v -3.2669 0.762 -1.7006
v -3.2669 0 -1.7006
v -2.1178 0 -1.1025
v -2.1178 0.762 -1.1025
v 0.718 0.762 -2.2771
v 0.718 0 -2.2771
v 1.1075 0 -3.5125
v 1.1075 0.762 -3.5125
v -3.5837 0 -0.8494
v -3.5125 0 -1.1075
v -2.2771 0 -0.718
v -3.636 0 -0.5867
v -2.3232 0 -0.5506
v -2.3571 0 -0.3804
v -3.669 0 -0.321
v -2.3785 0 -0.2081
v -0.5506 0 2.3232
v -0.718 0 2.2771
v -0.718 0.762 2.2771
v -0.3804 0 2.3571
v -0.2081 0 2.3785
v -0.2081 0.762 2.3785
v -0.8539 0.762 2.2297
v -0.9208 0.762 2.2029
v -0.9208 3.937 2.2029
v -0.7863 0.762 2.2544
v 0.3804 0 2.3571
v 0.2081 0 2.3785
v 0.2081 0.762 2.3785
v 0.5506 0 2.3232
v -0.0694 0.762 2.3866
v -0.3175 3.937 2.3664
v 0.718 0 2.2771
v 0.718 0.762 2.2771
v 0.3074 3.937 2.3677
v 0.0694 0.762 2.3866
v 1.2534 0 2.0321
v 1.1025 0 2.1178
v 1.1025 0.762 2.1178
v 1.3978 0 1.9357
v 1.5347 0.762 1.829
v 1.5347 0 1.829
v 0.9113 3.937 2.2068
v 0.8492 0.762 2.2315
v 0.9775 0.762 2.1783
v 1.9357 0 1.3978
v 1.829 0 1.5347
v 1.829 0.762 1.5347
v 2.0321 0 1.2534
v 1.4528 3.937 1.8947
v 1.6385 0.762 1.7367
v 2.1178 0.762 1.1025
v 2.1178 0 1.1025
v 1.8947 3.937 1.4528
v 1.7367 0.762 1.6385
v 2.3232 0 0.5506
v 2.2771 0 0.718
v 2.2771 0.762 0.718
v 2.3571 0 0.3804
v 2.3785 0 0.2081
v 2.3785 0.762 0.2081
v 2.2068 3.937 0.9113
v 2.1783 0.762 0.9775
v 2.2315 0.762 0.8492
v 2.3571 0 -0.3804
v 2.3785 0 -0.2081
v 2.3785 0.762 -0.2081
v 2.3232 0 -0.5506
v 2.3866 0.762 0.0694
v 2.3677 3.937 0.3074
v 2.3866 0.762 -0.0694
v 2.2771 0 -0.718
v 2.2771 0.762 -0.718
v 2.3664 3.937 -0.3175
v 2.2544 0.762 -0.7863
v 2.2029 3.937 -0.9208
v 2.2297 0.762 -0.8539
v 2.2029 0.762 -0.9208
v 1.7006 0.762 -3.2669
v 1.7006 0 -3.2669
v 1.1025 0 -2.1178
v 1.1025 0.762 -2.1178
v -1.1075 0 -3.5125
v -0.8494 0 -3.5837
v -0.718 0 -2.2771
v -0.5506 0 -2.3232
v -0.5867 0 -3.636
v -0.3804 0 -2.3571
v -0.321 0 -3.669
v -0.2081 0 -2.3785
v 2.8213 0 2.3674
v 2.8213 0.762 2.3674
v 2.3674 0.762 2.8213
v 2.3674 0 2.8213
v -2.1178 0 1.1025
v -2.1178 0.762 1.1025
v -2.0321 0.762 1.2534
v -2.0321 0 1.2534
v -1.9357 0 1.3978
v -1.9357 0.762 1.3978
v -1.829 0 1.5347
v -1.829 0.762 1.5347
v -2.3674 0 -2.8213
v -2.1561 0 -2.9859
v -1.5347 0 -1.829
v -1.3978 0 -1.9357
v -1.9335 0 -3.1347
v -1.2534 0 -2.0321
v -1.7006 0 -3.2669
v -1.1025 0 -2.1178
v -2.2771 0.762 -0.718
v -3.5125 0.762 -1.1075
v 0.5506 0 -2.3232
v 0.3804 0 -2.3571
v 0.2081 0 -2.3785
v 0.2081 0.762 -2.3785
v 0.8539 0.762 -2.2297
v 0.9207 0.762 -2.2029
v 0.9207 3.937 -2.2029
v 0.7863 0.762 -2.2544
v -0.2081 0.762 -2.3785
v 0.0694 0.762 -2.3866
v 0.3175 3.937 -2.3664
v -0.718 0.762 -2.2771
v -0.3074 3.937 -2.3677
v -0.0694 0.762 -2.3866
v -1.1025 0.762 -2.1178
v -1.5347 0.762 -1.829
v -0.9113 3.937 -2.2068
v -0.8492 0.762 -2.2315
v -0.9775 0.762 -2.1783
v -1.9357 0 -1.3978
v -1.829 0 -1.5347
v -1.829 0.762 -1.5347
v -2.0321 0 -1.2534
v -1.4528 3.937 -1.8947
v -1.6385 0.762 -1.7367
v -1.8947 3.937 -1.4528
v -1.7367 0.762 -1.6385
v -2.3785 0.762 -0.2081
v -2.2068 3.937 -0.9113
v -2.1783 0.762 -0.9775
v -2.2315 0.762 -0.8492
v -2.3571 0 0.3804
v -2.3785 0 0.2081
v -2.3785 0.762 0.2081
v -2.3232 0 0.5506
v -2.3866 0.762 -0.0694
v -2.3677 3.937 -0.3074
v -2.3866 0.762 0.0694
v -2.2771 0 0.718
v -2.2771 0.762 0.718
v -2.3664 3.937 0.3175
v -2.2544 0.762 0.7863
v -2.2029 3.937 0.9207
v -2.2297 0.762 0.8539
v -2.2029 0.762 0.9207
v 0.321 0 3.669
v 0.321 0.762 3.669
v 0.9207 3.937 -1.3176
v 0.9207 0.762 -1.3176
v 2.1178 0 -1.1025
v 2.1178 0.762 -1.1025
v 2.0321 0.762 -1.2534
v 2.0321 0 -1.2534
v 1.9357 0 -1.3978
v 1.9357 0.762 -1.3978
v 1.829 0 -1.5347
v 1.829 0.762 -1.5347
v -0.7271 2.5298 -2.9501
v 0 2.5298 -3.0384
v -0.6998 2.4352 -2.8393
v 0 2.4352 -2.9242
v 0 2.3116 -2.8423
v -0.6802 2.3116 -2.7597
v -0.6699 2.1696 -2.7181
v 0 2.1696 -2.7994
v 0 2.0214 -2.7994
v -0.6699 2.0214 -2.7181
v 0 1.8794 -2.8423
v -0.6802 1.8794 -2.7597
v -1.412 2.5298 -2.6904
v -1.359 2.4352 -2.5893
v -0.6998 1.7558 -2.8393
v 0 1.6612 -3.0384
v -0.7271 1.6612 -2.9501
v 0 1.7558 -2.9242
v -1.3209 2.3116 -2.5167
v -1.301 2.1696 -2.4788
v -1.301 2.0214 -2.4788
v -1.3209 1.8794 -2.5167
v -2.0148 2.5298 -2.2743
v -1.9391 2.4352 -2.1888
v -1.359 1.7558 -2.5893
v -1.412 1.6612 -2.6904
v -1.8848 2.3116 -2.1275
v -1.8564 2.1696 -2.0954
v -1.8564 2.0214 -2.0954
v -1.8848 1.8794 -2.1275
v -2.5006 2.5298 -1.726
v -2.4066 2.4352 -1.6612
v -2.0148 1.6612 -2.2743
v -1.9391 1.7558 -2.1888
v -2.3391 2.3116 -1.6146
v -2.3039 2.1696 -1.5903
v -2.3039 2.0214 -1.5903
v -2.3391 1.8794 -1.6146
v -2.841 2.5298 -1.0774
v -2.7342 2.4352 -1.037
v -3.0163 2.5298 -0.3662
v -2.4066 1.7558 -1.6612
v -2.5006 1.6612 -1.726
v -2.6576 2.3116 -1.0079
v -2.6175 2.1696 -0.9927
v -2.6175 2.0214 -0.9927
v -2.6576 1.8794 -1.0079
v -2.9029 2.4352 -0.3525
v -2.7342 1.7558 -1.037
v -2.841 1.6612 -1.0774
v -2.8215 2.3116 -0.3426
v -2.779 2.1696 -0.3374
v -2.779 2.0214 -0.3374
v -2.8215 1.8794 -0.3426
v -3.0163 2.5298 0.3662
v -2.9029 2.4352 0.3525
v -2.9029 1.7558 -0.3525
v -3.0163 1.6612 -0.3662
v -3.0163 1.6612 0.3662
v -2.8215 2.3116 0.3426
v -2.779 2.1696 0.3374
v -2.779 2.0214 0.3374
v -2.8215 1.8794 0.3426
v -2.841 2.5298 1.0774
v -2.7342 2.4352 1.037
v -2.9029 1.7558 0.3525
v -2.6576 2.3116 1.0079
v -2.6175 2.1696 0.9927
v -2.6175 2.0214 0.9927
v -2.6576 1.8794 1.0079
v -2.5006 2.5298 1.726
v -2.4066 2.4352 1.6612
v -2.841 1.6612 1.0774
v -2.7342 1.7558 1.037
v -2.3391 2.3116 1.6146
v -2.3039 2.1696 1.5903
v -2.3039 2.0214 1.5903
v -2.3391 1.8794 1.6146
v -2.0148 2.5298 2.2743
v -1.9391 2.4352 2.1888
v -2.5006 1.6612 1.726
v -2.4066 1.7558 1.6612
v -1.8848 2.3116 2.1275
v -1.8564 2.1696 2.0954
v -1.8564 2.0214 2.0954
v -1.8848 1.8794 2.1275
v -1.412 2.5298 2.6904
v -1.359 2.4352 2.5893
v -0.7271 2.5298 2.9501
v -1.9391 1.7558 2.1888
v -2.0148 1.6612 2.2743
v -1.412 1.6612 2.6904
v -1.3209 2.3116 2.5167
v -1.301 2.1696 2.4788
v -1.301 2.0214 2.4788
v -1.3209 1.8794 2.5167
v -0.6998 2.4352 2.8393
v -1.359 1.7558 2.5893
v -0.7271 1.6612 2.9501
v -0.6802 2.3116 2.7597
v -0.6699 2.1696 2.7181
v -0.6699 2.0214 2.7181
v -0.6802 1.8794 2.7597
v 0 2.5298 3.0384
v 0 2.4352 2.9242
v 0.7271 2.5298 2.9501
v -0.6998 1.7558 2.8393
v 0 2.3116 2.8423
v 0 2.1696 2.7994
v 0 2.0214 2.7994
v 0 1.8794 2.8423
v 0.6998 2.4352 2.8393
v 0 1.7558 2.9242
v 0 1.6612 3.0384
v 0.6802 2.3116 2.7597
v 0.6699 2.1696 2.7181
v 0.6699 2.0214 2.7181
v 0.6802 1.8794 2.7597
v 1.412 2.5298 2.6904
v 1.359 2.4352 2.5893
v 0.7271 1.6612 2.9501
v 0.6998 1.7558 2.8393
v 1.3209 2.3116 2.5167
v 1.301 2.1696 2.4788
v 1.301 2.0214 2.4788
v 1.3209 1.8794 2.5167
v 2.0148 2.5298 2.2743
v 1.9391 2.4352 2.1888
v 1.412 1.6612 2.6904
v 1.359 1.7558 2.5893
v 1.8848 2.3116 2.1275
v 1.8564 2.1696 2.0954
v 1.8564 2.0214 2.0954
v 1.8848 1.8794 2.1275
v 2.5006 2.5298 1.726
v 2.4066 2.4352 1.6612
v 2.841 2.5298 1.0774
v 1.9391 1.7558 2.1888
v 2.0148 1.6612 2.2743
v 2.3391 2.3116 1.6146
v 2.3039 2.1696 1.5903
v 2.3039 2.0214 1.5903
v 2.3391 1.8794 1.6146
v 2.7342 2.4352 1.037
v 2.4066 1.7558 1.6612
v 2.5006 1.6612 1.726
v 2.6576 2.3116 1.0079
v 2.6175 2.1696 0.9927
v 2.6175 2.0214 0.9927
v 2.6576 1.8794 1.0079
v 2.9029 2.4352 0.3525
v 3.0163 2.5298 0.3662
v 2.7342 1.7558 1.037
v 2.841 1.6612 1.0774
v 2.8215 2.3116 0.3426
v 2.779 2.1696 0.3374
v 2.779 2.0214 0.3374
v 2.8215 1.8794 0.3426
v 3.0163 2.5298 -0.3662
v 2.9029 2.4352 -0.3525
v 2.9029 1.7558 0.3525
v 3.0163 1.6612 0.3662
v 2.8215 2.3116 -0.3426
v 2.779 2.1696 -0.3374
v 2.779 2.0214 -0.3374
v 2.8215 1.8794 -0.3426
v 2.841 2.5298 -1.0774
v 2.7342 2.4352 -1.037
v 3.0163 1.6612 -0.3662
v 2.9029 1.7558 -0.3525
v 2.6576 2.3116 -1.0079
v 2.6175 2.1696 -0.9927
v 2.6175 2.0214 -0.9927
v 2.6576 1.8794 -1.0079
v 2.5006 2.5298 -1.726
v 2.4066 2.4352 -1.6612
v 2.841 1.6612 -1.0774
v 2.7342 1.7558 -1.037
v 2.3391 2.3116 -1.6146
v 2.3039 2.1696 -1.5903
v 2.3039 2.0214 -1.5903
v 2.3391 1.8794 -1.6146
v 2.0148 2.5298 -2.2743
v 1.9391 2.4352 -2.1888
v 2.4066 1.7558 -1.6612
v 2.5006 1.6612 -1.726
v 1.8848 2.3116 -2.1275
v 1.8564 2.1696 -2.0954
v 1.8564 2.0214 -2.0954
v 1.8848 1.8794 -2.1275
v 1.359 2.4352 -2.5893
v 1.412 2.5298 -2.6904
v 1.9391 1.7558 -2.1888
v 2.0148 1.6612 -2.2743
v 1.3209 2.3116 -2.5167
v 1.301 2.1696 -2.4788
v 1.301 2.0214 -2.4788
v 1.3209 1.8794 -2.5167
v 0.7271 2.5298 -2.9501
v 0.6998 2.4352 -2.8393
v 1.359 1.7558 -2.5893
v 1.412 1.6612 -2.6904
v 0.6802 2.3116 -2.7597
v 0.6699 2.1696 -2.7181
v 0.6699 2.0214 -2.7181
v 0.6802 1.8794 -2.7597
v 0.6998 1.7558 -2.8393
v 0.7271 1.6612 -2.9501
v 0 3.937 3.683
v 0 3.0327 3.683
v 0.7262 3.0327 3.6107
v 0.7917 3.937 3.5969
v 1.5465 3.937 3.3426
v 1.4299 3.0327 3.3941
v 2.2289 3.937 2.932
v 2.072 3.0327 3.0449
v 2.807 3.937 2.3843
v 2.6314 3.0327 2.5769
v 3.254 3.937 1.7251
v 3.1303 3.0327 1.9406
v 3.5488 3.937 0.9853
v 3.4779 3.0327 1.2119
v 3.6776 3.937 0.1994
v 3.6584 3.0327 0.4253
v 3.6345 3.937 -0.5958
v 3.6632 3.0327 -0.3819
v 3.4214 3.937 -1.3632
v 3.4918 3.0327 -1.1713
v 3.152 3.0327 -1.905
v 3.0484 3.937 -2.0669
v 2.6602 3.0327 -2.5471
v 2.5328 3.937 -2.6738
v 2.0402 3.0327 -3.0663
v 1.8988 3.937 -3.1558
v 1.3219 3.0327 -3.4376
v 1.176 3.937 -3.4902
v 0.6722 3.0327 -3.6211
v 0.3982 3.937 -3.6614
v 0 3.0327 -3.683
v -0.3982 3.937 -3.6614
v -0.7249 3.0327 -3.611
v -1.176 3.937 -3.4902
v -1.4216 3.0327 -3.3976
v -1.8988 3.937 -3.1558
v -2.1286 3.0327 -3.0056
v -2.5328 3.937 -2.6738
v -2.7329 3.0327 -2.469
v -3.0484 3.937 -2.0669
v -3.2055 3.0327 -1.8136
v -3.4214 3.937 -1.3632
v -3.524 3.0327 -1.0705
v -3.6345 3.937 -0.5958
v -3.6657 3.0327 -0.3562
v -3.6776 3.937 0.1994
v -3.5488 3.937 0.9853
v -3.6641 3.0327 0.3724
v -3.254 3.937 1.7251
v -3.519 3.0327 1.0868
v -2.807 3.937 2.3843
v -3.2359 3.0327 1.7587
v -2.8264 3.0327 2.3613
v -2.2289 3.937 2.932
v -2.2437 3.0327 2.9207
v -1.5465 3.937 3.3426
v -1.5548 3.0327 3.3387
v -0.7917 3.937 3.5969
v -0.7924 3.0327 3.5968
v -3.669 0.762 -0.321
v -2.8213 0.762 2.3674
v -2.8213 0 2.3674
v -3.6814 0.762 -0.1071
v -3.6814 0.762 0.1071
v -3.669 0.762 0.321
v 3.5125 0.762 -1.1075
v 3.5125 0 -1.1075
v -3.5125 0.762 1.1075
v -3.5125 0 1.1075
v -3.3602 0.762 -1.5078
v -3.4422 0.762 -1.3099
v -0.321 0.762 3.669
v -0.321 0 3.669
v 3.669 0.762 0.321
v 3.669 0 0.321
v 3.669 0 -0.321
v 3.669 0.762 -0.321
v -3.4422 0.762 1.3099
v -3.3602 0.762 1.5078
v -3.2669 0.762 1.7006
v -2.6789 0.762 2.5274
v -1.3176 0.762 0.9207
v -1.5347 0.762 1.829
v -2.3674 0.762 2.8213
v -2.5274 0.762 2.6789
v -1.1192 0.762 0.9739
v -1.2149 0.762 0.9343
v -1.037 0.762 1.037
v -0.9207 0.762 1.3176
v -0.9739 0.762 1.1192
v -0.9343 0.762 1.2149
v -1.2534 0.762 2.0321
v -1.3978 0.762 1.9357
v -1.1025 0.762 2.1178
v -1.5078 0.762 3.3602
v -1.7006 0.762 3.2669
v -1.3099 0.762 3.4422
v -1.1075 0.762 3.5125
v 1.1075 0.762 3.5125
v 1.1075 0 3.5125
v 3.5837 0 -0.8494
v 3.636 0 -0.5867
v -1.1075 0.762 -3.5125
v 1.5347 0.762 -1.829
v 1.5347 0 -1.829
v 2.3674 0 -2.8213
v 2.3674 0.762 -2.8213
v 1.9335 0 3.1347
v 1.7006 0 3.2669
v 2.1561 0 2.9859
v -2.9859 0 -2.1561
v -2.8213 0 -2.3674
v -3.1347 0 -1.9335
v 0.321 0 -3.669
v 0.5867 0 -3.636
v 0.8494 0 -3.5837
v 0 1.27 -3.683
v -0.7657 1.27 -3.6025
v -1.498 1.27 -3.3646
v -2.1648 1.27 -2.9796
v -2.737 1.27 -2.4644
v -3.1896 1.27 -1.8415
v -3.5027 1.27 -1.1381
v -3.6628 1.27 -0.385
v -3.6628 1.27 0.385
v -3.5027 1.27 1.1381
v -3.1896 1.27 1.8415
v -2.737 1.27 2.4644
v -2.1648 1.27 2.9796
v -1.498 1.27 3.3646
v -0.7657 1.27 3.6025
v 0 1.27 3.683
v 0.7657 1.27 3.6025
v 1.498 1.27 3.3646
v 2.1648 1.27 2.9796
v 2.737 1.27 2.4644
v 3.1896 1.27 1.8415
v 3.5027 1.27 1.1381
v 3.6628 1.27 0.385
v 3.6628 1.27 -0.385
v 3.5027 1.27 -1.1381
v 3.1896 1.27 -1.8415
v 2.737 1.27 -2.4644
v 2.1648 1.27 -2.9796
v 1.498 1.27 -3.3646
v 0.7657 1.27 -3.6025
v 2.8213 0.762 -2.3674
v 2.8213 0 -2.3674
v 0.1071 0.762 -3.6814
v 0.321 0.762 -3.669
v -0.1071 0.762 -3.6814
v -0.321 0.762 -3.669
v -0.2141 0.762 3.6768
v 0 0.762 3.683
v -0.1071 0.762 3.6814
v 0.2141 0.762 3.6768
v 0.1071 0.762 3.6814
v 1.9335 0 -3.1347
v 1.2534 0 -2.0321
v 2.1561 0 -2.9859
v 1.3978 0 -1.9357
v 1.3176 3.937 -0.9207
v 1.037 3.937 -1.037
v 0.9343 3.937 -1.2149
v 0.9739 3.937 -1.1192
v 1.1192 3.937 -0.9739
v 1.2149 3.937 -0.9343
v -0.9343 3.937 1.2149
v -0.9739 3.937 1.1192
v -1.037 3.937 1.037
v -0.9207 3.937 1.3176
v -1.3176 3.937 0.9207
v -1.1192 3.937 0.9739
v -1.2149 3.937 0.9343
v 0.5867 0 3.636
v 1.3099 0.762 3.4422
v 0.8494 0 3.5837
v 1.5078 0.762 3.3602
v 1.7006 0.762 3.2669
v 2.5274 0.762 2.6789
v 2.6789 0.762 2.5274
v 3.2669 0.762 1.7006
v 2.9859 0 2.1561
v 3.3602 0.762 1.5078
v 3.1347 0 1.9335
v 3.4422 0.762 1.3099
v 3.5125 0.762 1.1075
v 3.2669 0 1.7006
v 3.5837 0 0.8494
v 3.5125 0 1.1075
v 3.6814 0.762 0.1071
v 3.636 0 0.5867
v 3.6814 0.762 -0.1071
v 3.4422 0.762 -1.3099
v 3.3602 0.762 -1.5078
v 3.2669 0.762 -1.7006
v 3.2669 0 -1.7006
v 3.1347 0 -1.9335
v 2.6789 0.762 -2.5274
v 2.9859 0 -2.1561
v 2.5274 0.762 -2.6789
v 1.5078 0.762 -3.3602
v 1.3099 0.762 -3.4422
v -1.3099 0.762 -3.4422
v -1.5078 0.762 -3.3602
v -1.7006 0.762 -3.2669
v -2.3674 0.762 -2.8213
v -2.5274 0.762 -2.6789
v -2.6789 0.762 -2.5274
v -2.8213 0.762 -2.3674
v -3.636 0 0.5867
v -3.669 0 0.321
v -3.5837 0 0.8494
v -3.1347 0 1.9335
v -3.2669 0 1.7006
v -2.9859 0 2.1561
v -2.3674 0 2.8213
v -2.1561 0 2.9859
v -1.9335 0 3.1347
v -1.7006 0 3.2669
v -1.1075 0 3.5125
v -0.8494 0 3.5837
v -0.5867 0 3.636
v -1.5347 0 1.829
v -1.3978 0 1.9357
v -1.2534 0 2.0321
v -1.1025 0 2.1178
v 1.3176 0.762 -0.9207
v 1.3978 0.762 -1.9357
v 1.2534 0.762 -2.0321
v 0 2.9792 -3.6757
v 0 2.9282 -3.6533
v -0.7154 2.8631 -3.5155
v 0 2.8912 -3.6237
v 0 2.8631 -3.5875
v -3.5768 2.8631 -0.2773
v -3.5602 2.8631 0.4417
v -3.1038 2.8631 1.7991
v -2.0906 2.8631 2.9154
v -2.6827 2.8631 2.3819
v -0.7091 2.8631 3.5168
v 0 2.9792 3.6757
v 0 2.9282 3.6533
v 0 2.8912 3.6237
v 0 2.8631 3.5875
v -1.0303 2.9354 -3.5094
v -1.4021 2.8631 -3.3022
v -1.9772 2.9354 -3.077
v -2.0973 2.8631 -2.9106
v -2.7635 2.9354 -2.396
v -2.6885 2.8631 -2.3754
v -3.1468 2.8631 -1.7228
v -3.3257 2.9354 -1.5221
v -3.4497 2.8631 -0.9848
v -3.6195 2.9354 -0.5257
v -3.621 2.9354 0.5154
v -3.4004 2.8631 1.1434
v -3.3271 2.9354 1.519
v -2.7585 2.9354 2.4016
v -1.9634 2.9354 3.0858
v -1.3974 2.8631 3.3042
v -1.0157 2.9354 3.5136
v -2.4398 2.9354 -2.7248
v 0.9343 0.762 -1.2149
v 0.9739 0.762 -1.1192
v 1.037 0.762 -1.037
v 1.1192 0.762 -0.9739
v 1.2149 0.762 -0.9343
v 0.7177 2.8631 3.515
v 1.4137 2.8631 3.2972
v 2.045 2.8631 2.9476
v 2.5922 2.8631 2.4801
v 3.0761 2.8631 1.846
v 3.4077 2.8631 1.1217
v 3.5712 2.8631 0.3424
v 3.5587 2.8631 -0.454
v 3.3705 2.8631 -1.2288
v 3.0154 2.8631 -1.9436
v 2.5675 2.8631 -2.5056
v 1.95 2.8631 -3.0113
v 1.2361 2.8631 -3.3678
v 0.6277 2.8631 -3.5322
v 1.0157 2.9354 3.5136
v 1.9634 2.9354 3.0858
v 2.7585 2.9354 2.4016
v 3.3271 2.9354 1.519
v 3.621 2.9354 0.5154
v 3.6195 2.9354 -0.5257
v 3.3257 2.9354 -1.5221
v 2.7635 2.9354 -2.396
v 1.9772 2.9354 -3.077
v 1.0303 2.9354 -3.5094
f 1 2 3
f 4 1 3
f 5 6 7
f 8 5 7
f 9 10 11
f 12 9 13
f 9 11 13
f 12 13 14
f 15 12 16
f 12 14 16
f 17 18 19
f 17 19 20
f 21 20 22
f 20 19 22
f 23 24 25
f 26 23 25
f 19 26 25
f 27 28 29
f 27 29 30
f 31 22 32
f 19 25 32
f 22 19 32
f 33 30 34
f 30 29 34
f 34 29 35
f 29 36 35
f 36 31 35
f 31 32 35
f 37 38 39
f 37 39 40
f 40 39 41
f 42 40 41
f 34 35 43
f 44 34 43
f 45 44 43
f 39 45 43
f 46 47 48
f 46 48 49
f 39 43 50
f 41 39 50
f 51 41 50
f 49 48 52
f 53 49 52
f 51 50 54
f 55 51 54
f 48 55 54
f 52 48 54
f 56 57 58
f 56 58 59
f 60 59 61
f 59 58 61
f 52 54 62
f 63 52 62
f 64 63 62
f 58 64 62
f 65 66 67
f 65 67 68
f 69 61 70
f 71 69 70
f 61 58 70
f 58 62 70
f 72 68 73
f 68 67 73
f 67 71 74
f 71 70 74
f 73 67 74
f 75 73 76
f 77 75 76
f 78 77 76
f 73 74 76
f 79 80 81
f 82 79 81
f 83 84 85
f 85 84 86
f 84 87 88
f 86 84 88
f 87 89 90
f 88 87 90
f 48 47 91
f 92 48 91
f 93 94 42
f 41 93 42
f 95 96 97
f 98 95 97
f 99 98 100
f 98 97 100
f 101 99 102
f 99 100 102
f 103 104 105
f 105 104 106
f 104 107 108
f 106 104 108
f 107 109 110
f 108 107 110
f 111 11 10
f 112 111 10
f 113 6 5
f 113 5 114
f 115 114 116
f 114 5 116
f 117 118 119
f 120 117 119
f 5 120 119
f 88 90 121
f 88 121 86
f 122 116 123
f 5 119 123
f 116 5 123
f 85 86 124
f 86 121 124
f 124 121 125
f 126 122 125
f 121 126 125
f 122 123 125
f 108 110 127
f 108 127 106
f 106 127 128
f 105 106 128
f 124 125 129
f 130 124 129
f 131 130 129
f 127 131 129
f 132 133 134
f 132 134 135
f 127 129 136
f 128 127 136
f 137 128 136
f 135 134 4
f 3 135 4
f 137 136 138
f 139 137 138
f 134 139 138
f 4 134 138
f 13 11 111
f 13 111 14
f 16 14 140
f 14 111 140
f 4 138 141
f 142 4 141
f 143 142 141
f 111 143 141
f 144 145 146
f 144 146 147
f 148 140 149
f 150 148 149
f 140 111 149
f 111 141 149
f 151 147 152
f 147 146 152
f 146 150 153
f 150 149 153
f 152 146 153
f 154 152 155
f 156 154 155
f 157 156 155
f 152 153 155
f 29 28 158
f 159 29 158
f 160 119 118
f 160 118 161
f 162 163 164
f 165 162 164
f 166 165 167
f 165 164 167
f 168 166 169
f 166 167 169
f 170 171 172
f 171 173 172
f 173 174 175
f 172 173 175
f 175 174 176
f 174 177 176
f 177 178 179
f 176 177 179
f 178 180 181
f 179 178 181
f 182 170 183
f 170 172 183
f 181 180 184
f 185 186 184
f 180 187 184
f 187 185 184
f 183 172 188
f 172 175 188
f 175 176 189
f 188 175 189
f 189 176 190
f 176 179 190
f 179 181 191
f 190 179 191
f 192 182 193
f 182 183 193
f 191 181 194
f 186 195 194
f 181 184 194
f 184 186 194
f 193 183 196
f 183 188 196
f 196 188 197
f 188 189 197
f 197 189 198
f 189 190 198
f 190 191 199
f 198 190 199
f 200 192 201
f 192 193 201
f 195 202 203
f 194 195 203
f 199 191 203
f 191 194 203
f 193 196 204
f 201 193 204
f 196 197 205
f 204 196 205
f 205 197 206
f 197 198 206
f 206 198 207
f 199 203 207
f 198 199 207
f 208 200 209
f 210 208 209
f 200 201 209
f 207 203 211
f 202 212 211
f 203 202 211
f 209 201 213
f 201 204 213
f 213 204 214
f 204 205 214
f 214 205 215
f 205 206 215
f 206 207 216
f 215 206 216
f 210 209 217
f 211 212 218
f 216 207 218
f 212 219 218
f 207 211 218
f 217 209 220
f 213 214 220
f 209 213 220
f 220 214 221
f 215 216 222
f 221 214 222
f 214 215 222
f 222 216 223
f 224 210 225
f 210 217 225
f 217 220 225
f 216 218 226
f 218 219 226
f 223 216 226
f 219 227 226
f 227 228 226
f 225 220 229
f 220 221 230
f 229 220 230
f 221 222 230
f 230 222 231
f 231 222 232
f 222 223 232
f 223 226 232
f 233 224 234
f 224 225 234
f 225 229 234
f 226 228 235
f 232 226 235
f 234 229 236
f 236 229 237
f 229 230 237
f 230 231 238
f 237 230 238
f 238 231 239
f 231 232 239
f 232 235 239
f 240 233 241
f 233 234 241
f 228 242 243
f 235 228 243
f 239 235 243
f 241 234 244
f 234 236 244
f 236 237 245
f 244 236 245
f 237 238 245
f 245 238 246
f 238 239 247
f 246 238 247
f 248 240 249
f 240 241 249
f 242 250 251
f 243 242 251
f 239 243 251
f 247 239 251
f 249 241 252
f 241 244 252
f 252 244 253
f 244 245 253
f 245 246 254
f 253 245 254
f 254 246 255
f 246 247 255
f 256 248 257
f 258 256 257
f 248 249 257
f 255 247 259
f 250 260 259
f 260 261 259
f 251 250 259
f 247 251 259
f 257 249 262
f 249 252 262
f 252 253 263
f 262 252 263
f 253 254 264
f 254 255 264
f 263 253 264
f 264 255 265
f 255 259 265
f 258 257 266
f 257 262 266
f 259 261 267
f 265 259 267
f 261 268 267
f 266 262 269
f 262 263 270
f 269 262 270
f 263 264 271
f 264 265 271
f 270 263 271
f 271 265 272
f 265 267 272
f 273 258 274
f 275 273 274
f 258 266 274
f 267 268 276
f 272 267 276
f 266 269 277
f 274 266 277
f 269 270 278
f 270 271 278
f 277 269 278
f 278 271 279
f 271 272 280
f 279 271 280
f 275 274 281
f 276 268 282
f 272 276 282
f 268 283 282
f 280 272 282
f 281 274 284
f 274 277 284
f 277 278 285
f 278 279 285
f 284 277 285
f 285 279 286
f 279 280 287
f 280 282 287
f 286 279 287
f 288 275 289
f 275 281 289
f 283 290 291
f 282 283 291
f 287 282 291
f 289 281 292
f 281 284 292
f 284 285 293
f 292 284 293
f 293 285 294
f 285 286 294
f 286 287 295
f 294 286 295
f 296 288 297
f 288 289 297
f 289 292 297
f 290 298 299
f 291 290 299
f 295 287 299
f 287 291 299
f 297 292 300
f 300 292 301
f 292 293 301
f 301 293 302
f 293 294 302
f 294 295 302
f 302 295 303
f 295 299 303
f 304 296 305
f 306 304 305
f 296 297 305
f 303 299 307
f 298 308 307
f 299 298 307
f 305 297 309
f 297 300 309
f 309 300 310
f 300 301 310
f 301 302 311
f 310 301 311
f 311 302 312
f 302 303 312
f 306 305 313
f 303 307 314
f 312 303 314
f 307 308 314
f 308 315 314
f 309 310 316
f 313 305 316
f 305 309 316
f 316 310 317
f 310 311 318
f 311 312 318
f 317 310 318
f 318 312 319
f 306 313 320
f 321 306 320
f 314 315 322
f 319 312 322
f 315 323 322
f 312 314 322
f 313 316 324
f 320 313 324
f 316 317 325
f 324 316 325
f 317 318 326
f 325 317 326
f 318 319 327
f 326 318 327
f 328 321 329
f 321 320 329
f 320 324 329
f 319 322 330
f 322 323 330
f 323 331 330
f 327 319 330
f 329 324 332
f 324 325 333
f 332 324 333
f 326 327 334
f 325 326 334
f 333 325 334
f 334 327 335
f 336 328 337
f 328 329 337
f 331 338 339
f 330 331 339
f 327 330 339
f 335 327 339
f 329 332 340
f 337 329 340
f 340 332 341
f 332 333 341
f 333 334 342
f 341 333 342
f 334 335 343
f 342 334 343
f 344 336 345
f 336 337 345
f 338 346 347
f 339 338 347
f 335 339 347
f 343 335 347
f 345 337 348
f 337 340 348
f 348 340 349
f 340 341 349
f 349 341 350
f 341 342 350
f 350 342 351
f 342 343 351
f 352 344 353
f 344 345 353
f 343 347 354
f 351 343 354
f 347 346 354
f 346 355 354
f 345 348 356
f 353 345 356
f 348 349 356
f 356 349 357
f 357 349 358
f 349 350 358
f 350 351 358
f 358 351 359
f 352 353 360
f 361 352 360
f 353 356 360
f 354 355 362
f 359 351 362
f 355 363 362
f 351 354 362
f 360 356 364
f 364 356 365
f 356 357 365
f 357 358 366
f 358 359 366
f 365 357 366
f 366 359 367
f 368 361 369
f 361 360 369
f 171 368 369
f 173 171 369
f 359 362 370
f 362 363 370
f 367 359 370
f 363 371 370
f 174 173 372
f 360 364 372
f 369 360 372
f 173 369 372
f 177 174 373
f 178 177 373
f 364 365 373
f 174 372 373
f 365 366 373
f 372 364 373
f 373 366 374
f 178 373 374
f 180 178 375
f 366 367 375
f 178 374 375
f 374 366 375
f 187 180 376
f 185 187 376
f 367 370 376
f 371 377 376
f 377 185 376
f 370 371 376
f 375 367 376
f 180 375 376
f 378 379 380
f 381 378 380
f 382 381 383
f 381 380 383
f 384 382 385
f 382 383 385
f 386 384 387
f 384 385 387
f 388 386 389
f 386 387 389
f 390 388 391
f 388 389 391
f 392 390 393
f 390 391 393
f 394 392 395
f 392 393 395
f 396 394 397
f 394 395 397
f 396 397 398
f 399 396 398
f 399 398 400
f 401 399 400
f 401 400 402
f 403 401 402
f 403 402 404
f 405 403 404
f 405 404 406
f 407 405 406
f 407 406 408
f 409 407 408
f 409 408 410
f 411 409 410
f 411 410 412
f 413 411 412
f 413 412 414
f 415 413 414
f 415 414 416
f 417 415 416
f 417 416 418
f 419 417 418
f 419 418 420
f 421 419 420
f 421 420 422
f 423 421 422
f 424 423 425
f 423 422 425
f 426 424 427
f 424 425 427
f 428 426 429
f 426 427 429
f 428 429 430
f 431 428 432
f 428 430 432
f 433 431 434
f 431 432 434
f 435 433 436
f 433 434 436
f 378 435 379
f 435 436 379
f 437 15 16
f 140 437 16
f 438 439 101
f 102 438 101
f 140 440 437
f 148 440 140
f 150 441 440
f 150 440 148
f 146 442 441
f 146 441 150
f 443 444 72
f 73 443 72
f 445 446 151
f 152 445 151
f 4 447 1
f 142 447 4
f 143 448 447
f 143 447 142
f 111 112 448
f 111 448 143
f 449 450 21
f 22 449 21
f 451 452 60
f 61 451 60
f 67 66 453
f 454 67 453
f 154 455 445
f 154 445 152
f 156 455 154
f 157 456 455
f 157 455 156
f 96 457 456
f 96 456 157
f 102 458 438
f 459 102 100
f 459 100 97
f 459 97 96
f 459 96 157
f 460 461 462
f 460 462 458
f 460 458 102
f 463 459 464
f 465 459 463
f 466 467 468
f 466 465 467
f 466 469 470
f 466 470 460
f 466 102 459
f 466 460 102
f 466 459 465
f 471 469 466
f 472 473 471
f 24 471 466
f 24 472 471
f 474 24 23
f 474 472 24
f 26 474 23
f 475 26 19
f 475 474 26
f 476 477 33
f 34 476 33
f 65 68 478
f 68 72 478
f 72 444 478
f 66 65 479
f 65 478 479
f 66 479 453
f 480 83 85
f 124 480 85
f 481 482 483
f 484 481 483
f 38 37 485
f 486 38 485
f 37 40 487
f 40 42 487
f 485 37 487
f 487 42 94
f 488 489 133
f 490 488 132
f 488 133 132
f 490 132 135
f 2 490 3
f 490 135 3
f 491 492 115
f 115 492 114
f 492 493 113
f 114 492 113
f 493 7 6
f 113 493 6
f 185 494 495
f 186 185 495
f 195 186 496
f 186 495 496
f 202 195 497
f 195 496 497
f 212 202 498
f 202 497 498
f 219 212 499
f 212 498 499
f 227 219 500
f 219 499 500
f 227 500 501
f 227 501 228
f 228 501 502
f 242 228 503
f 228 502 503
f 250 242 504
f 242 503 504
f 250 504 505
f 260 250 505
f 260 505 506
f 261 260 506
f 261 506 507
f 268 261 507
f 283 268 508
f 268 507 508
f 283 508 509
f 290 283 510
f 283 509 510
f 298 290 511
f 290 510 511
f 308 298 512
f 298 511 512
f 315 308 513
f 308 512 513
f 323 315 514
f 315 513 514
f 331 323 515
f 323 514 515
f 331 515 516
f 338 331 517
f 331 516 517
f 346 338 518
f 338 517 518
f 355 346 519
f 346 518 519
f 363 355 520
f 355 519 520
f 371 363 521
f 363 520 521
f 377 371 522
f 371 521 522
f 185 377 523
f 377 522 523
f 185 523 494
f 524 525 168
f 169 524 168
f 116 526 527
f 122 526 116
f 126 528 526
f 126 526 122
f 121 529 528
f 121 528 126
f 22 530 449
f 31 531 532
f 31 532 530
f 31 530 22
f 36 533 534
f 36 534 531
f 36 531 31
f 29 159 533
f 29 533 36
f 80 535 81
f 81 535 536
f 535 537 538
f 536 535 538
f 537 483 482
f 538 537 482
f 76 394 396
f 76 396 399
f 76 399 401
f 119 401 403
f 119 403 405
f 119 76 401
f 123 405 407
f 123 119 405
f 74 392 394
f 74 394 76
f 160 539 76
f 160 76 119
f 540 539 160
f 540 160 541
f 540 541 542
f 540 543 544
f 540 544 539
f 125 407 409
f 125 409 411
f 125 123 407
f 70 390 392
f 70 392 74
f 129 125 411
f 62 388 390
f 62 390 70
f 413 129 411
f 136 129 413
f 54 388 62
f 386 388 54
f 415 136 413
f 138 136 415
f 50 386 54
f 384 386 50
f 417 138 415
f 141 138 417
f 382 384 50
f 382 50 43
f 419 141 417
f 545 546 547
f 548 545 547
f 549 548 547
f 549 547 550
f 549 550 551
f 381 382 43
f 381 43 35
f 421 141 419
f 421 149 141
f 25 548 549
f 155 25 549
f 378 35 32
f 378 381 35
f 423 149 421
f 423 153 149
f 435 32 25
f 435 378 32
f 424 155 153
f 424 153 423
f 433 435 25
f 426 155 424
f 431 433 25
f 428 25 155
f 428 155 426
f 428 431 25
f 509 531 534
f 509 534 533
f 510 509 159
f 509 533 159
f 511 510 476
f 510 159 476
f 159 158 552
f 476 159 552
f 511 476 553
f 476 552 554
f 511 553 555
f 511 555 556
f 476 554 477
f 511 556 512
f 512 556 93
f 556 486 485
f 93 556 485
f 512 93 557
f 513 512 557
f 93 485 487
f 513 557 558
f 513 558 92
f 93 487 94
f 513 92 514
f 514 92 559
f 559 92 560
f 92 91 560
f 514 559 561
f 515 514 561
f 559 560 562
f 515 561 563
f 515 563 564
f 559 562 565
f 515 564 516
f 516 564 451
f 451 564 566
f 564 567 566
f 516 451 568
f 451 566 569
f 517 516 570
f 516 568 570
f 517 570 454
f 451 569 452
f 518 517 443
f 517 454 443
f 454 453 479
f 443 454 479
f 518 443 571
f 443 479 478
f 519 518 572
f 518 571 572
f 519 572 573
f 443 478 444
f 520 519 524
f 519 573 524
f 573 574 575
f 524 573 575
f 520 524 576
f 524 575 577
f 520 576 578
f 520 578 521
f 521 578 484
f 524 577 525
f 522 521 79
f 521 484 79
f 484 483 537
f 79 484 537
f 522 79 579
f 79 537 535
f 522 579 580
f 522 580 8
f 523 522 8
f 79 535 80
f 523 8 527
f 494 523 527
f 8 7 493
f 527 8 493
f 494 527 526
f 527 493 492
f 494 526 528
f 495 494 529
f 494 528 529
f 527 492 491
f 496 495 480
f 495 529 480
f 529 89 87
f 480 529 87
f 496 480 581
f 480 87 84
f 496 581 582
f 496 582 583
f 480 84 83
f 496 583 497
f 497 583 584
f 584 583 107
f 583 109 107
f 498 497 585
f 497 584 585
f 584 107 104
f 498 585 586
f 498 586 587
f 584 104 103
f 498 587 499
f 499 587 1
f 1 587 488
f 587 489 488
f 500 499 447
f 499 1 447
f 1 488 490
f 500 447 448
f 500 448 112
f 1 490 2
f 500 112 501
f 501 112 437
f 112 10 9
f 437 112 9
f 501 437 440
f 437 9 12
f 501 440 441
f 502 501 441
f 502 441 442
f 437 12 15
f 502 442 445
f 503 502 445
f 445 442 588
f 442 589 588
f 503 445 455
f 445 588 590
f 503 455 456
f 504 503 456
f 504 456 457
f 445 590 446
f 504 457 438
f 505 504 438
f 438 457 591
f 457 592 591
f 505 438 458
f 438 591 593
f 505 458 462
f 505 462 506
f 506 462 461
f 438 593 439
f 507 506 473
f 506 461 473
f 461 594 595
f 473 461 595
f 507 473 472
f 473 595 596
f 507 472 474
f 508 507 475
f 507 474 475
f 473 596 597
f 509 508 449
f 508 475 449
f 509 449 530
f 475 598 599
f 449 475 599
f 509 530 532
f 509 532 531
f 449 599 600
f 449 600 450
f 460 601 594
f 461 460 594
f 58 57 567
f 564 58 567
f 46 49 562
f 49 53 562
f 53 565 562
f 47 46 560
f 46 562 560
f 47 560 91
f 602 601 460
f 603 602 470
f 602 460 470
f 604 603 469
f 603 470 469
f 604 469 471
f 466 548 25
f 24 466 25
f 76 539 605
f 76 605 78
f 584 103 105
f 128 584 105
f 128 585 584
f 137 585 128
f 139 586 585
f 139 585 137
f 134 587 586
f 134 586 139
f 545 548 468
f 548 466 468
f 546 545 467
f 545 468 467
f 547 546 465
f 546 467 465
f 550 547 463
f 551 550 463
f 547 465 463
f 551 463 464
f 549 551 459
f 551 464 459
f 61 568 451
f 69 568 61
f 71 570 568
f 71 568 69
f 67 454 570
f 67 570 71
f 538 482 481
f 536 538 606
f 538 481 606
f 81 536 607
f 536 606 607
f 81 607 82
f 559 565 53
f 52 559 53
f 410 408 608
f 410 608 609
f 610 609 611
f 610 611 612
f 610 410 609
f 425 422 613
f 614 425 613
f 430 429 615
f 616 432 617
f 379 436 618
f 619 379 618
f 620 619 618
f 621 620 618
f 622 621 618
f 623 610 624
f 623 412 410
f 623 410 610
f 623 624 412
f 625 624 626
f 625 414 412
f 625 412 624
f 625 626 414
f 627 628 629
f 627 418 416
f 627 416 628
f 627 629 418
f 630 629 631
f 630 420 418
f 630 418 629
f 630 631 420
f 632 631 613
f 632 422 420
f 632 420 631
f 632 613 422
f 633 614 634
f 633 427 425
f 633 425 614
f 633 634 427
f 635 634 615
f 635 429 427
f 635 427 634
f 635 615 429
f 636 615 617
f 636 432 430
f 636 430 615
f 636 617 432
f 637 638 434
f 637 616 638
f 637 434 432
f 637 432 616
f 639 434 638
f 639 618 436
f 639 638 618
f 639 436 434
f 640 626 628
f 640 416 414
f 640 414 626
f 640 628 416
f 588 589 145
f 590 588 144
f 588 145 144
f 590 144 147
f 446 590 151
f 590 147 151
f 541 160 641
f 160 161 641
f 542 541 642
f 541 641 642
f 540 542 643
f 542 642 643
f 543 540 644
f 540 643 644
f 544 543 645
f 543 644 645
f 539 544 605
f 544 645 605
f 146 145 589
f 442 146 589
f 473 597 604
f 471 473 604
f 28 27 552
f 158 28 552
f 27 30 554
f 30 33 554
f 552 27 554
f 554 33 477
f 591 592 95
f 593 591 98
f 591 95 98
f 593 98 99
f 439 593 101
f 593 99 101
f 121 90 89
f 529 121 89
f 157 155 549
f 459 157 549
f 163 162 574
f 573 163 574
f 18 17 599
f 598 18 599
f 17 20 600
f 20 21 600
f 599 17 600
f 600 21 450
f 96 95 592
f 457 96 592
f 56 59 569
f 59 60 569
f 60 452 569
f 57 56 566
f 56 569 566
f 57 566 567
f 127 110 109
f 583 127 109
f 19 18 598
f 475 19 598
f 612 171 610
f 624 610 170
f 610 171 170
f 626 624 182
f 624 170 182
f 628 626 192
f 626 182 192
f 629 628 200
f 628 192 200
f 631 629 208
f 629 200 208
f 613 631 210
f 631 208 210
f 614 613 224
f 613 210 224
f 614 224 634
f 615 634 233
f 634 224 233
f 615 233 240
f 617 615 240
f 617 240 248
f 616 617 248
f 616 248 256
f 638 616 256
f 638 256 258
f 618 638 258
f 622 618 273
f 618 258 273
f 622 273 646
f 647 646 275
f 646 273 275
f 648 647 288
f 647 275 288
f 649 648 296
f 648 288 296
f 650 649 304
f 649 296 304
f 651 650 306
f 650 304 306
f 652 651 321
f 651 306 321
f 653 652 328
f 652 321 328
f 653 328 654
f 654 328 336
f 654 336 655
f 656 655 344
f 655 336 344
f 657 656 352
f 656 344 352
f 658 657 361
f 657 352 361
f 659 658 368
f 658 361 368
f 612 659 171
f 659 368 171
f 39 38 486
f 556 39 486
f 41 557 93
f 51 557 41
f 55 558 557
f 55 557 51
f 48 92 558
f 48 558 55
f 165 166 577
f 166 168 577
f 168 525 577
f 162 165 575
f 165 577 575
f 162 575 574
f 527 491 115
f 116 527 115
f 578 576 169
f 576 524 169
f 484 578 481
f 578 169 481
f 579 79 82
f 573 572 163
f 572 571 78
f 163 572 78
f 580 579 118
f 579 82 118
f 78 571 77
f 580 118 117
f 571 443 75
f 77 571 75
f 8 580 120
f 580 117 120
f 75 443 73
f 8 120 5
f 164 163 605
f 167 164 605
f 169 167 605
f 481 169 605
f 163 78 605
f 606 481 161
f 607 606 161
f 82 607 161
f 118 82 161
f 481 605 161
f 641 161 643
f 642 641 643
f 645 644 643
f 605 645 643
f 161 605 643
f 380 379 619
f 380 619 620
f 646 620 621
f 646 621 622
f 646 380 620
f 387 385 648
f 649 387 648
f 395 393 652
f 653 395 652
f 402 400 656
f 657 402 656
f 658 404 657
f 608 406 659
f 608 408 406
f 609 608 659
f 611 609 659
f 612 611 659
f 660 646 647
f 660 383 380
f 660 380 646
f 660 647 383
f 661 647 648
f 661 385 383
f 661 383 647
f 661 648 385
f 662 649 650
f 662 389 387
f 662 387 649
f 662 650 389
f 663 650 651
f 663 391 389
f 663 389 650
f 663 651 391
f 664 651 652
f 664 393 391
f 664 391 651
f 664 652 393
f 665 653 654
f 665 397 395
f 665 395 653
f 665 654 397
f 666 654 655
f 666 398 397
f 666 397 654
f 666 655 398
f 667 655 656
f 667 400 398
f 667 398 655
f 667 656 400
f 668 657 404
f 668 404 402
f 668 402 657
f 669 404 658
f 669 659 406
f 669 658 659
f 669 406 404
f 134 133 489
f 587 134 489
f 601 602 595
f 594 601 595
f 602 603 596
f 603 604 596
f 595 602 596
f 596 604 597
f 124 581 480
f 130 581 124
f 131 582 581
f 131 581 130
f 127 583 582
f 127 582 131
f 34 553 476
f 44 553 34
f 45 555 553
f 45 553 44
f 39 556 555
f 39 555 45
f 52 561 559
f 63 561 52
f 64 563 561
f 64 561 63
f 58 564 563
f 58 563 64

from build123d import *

# Parameters (mm, degrees)
SKETCH1_R           = 3.683
BASE_EXTRUDE_DEPTH  = 3.937
SKETCH2_R           = 2.3876
CUT_EXTRUDE1_DEPTH  = 7.529084698
CUT_EXTRUDE2_DEPTH  = 0.762
CIRPATTERN1_COUNT   = 16
BOSS_EXTRUDE1_DEPTH = 3.175
FILLET1_R           = 0.396875
FILLET2_R           = 0.1984375


with BuildPart() as part:
    # Sketch1 → Base-Extrude (new body)
    with BuildSketch(Plane(origin=(0, 0, 0), x_dir=(1, 0, 0), z_dir=(0, 1, 0))):
        with Locations(Location((0, 0, 0), (0, 0, 270))):
            Circle(SKETCH1_R)
    extrude(amount=BASE_EXTRUDE_DEPTH)

    # Sketch2 → Cut-Extrude1 (cut, through all)
    with BuildSketch(Plane(origin=(0, 3.937, 0), x_dir=(-1, 0, 0), z_dir=(0, 1, 0))):
        with Locations(Location((0, 0, 0), (0, 0, 90))):
            Circle(SKETCH2_R)
    extrude(amount=-CUT_EXTRUDE1_DEPTH, mode=Mode.SUBTRACT)

    # Sketch4 → Cut-Revolve1 (revolve, cut)
    with BuildSketch(Plane.XY, mode=Mode.PRIVATE) as cut_revolve1_sk:
        with BuildLine():
            Line((3.683, 2.921), (3.038418755, 2.529768267))
            ThreePointArc((3.038418755, 2.529768267), (2.794, 2.0955), (3.038418755, 1.661231733))
            Line((3.038418755, 1.661231733), (3.683, 1.27))
            Line((3.683, 1.27), (3.683, 2.921))
        make_face()
    revolve(cut_revolve1_sk.sketch.rotate(Axis((0, 0, 0), (0, 1, 0)), 90), axis=Axis((0, 0, 0), (0, 1, 0)), mode=Mode.SUBTRACT)

    # Sketch5 → Cut-Extrude2 (cut)
    with BuildSketch(Plane(origin=(16.494267977, 0, 2.582932293), x_dir=(1, 0, 0), z_dir=(0, -1, 0))):
        with BuildLine():
            Line((-18.872782439, -2.374839241), (-20.163253051, -2.261937692))
            ThreePointArc((-20.163253051, -2.261937692), (-20.177267977, -2.582932293), (-20.163253051, -2.903926893))
            Line((-20.163253051, -2.903926893), (-18.872782439, -2.791025344))
            ThreePointArc((-18.872782439, -2.791025344), (-18.881867977, -2.582932293), (-18.872782439, -2.374839241))
        make_face()
    cut_extrude2 = extrude(amount=-CUT_EXTRUDE2_DEPTH, mode=Mode.SUBTRACT)

    # CirPattern1: Cut-Extrude2 ×16 about axis
    cirpattern1_axis = Axis((0, 0, 0), (0, 1, 0))
    for i in range(1, CIRPATTERN1_COUNT):
        add(cut_extrude2.rotate(cirpattern1_axis, i * 360 / CIRPATTERN1_COUNT), mode=Mode.SUBTRACT)

    # Sketch6 → Boss-Extrude1 (add)
    with BuildSketch(Plane(origin=(0, 3.937, 0), x_dir=(-1, 0, 0), z_dir=(0, 1, 0))):
        with BuildLine():
            Line((-0.92075, -2.202919244), (-0.92075, -0.92075))
            Line((-0.92075, -0.92075), (-2.202919244, -0.92075))
            ThreePointArc((-2.202919244, -0.92075), (-1.688288151, -1.688288151), (-0.92075, -2.202919244))
        make_face()
        with BuildLine():
            Line((2.202919244, 0.92075), (0.92075, 0.92075))
            Line((0.92075, 0.92075), (0.92075, 2.202919244))
            ThreePointArc((0.92075, 2.202919244), (1.688288151, 1.688288151), (2.202919244, 0.92075))
        make_face()
    extrude(amount=-BOSS_EXTRUDE1_DEPTH)

    # Fillet1
    fillet1_edges = [part.edges().sort_by_distance(p)[0] for p in [
        (0.92075, 2.3495, -0.92075),
        (-0.92075, 2.3495, 0.92075),
    ]]
    fillet(fillet1_edges, radius=FILLET1_R)

    # Fillet2
    fillet2_edges = [part.edges().sort_by_distance(p)[0] for p in [
        (-3.683, 2.921, 0),
        (-3.683, 2.921, 0),
    ]]
    fillet(fillet2_edges, radius=FILLET2_R)


solid = part.part
